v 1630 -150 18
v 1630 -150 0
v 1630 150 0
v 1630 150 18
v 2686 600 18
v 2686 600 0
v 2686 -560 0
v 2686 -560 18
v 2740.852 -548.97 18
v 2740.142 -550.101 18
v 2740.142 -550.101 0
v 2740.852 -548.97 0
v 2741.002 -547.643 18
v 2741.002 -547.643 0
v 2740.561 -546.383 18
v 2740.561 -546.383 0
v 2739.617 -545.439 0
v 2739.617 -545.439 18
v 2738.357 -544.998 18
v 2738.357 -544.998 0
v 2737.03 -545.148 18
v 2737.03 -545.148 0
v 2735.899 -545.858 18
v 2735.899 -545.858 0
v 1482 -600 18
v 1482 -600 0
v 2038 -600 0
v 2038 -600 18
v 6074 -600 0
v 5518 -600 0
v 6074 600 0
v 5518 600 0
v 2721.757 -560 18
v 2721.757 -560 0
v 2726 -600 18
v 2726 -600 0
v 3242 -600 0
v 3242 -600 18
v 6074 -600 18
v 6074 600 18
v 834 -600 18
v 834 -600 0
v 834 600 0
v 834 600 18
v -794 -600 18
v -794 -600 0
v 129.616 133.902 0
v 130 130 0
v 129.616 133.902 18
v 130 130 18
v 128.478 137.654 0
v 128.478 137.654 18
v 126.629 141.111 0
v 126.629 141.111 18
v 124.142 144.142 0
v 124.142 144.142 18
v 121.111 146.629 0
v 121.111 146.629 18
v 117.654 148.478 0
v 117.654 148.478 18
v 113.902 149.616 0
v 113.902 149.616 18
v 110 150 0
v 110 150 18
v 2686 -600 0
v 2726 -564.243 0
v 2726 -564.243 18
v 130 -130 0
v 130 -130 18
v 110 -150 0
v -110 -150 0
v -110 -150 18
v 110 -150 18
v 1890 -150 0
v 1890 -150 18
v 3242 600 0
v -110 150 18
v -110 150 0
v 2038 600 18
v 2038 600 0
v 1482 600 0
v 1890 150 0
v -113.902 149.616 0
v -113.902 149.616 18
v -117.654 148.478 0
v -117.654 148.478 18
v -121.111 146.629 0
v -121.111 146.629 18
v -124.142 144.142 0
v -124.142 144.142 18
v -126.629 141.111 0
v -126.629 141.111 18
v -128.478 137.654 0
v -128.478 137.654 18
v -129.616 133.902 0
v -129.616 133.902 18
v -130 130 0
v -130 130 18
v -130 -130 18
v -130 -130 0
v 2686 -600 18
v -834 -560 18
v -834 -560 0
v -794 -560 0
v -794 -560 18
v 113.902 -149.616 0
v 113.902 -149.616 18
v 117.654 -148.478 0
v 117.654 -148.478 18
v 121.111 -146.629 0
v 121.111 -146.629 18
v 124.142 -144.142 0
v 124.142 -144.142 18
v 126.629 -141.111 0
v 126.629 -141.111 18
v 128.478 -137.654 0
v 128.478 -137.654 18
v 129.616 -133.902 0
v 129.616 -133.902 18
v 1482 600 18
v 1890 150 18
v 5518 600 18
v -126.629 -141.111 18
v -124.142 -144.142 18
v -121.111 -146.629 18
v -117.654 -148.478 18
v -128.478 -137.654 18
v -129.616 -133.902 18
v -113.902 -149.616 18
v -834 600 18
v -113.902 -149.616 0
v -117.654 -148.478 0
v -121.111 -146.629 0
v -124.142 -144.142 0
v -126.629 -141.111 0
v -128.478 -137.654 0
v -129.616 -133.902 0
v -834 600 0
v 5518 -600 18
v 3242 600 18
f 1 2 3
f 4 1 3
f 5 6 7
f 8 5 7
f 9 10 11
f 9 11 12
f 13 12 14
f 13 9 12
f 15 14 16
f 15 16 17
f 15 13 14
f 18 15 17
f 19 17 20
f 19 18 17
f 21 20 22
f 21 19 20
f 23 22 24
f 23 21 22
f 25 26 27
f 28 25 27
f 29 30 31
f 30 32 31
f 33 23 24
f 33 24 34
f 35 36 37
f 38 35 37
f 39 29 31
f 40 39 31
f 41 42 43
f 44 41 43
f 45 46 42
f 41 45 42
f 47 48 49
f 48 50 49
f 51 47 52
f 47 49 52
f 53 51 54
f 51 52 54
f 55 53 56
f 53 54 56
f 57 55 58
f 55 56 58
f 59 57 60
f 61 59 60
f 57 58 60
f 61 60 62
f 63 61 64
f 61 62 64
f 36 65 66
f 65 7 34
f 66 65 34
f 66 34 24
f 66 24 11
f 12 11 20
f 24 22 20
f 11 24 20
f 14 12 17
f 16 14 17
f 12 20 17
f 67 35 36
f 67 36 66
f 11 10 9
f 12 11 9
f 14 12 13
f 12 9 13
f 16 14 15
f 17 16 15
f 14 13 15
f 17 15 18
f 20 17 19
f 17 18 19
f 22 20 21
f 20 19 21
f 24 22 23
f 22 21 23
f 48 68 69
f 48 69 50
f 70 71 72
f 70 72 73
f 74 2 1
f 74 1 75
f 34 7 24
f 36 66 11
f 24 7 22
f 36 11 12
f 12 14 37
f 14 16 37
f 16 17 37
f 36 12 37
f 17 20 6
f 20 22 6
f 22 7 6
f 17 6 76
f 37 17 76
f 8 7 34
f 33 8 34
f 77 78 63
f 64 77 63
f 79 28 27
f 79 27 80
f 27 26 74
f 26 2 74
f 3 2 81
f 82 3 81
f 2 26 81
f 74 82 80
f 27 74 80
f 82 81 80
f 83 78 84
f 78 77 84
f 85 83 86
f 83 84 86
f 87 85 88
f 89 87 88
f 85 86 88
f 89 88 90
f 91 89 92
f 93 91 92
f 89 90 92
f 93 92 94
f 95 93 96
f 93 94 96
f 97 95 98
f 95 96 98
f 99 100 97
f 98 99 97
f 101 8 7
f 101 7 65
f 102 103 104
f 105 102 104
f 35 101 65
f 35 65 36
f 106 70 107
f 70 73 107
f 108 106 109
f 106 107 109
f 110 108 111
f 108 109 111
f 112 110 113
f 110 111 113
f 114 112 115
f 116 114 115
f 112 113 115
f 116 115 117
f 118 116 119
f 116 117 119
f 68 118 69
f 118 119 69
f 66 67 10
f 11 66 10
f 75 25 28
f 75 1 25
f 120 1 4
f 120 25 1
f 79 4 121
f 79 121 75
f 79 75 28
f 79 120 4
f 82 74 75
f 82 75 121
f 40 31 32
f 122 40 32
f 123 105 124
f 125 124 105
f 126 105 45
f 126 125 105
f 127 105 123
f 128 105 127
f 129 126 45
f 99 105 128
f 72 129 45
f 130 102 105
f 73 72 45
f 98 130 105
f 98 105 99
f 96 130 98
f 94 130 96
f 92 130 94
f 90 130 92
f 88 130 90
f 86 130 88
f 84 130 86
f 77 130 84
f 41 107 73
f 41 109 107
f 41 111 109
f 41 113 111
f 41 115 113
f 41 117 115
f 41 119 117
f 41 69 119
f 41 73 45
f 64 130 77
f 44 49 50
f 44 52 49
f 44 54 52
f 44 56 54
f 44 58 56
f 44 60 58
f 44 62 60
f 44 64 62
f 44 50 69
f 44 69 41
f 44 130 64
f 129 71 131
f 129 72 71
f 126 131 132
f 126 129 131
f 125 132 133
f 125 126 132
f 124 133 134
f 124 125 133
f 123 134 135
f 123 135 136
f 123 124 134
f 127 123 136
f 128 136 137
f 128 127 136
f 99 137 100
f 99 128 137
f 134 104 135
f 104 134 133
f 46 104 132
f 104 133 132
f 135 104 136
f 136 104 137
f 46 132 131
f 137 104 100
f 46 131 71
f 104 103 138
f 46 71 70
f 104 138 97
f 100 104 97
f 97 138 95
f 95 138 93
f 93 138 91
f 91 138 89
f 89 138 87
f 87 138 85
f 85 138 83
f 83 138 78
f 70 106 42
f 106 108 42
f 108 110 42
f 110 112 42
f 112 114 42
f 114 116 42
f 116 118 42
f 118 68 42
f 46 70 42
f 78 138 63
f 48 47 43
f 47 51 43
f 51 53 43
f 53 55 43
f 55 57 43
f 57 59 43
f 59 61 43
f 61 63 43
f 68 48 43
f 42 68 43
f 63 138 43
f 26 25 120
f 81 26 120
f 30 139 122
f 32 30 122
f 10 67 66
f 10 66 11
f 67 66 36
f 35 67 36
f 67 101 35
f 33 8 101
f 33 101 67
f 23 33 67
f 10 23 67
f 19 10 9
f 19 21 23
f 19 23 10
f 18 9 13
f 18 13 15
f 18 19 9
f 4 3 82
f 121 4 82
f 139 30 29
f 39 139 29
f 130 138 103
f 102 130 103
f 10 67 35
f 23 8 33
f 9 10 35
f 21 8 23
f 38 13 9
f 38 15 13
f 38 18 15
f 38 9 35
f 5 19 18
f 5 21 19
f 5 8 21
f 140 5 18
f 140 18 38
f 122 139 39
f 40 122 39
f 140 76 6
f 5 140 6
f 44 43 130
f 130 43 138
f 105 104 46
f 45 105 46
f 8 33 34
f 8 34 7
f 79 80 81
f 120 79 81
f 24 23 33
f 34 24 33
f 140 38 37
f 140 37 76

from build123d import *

# Parameters (mm, degrees)
F0_W      = 260
F0_H      = 300
F1_DEPTH  = 18
F5_W      = 556
F5_H      = 1200
F6_DEPTH  = 25
F7_W      = 1112
F7_H      = 1200
F7_W_2    = 260
F7_H_2    = 300
F8_DEPTH  = 25
F9_W      = 260
F9_H      = 300
F10_DEPTH = 25
F11_R     = 20
F13_DEPTH = 18
F15_DEPTH = 18


with BuildPart() as f1:
    # F0 (on Top) → F1 (new body)
    with BuildSketch(Plane.XY):
        Polygon((834, -600), (834, 600), (-834, 600), (-834, -560), (-794, -560), (-794, -600), align=None)
        Rectangle(F0_W, F0_H, mode=Mode.SUBTRACT)
    extrude(amount=F1_DEPTH)


with BuildPart() as f2_1:
    # F2: copy of F1
    add(f1.part.moved(Location((1760, 0, 0))))


with BuildPart() as f3_1:
    # F3: copy of F2_1
    add(f2_1.part.moved(Location((1760, 0, 0))))


with BuildPart() as f4_1:
    # F4: copy of F3_1
    add(f3_1.part.moved(Location((1720, 0, 0))))

    # F9 (on face) → F10 (cut)
    with BuildSketch(Plane.XY.offset(18)):
        Polygon((5518, 600), (4406, 600), (4406, -560), (4446, -560), (4446, -600), (5518, -600), align=None)
        with Locations((5240, 0)):
            Rectangle(F9_W, F9_H, mode=Mode.SUBTRACT)
    extrude(amount=-F10_DEPTH, mode=Mode.SUBTRACT)


with BuildPart() as f2_1_1:
    add(f2_1.part)

    # F5 (on face) → F6 (cut)
    with BuildSketch(Plane.XY.offset(18)):
        Polygon((1482, 600), (926, 600), (926, -560), (966, -560), (966, -600), (1482, -600), align=None)
        with Locations((2316, 0)):
            Rectangle(F5_W, F5_H)
    extrude(amount=-F6_DEPTH, mode=Mode.SUBTRACT)


with BuildPart() as f3_1_1:
    add(f3_1.part)

    # F7 (on face) → F8 (cut)
    with BuildSketch(Plane.XY.offset(18)):
        with Locations((3798, 0)):
            Rectangle(F7_W, F7_H)
        with Locations((3520, 0)):
            Rectangle(F7_W_2, F7_H_2, mode=Mode.SUBTRACT)
    extrude(amount=-F8_DEPTH, mode=Mode.SUBTRACT)


with BuildPart() as f1_1:
    add(f1.part)

    # F11
    f11_edges = [f1_1.edges().sort_by_distance(p)[0] for p in [
        (-130, 150, 9),
        (-130, -150, 9),
        (130, -150, 9),
        (130, 150, 9),
    ]]
    fillet(f11_edges, radius=F11_R)


with BuildPart() as f13:
    # F12 (on face) → F13 (new body, through all)
    with BuildSketch(Plane.XY.offset(18)):
        Polygon((2721.7573593129, -560), (2686, -560), (2686, -600), (2726, -600), (2726, -564.2426406871), (2726, -560), align=None)
        with BuildLine():
            Line((2735.8994949366, -545.8578643763), (2721.7573593129, -560))
            Line((2721.7573593129, -560), (2726, -560))
            Line((2726, -560), (2726, -564.2426406871))
            Line((2726, -564.2426406871), (2740.1421356237, -550.1005050634))
            ThreePointArc((2740.1421356237, -550.1005050634), (2740.1421356237, -545.8578643763), (2735.8994949366, -545.8578643763))
        make_face()
    extrude(amount=-F13_DEPTH)


with BuildPart() as f3_1_2:
    add(f3_1_1.part)

    # F14: cut F13
    add(f13.part, mode=Mode.SUBTRACT)


with BuildPart() as f15:
    # F12 (on face) → F15 (new body, through all)
    with BuildSketch(Plane.XY.offset(18)):
        Polygon((2721.7573593129, -560), (2686, -560), (2686, -600), (2726, -600), (2726, -564.2426406871), (2726, -560), align=None)
        with BuildLine():
            Line((2735.8994949366, -545.8578643763), (2721.7573593129, -560))
            Line((2721.7573593129, -560), (2726, -560))
            Line((2726, -560), (2726, -564.2426406871))
            Line((2726, -564.2426406871), (2740.1421356237, -550.1005050634))
            ThreePointArc((2740.1421356237, -550.1005050634), (2740.1421356237, -545.8578643763), (2735.8994949366, -545.8578643763))
        make_face()
    extrude(amount=-F15_DEPTH)


solid = Compound([f4_1.part, f2_1_1.part, f1_1.part, f3_1_2.part, f15.part])
